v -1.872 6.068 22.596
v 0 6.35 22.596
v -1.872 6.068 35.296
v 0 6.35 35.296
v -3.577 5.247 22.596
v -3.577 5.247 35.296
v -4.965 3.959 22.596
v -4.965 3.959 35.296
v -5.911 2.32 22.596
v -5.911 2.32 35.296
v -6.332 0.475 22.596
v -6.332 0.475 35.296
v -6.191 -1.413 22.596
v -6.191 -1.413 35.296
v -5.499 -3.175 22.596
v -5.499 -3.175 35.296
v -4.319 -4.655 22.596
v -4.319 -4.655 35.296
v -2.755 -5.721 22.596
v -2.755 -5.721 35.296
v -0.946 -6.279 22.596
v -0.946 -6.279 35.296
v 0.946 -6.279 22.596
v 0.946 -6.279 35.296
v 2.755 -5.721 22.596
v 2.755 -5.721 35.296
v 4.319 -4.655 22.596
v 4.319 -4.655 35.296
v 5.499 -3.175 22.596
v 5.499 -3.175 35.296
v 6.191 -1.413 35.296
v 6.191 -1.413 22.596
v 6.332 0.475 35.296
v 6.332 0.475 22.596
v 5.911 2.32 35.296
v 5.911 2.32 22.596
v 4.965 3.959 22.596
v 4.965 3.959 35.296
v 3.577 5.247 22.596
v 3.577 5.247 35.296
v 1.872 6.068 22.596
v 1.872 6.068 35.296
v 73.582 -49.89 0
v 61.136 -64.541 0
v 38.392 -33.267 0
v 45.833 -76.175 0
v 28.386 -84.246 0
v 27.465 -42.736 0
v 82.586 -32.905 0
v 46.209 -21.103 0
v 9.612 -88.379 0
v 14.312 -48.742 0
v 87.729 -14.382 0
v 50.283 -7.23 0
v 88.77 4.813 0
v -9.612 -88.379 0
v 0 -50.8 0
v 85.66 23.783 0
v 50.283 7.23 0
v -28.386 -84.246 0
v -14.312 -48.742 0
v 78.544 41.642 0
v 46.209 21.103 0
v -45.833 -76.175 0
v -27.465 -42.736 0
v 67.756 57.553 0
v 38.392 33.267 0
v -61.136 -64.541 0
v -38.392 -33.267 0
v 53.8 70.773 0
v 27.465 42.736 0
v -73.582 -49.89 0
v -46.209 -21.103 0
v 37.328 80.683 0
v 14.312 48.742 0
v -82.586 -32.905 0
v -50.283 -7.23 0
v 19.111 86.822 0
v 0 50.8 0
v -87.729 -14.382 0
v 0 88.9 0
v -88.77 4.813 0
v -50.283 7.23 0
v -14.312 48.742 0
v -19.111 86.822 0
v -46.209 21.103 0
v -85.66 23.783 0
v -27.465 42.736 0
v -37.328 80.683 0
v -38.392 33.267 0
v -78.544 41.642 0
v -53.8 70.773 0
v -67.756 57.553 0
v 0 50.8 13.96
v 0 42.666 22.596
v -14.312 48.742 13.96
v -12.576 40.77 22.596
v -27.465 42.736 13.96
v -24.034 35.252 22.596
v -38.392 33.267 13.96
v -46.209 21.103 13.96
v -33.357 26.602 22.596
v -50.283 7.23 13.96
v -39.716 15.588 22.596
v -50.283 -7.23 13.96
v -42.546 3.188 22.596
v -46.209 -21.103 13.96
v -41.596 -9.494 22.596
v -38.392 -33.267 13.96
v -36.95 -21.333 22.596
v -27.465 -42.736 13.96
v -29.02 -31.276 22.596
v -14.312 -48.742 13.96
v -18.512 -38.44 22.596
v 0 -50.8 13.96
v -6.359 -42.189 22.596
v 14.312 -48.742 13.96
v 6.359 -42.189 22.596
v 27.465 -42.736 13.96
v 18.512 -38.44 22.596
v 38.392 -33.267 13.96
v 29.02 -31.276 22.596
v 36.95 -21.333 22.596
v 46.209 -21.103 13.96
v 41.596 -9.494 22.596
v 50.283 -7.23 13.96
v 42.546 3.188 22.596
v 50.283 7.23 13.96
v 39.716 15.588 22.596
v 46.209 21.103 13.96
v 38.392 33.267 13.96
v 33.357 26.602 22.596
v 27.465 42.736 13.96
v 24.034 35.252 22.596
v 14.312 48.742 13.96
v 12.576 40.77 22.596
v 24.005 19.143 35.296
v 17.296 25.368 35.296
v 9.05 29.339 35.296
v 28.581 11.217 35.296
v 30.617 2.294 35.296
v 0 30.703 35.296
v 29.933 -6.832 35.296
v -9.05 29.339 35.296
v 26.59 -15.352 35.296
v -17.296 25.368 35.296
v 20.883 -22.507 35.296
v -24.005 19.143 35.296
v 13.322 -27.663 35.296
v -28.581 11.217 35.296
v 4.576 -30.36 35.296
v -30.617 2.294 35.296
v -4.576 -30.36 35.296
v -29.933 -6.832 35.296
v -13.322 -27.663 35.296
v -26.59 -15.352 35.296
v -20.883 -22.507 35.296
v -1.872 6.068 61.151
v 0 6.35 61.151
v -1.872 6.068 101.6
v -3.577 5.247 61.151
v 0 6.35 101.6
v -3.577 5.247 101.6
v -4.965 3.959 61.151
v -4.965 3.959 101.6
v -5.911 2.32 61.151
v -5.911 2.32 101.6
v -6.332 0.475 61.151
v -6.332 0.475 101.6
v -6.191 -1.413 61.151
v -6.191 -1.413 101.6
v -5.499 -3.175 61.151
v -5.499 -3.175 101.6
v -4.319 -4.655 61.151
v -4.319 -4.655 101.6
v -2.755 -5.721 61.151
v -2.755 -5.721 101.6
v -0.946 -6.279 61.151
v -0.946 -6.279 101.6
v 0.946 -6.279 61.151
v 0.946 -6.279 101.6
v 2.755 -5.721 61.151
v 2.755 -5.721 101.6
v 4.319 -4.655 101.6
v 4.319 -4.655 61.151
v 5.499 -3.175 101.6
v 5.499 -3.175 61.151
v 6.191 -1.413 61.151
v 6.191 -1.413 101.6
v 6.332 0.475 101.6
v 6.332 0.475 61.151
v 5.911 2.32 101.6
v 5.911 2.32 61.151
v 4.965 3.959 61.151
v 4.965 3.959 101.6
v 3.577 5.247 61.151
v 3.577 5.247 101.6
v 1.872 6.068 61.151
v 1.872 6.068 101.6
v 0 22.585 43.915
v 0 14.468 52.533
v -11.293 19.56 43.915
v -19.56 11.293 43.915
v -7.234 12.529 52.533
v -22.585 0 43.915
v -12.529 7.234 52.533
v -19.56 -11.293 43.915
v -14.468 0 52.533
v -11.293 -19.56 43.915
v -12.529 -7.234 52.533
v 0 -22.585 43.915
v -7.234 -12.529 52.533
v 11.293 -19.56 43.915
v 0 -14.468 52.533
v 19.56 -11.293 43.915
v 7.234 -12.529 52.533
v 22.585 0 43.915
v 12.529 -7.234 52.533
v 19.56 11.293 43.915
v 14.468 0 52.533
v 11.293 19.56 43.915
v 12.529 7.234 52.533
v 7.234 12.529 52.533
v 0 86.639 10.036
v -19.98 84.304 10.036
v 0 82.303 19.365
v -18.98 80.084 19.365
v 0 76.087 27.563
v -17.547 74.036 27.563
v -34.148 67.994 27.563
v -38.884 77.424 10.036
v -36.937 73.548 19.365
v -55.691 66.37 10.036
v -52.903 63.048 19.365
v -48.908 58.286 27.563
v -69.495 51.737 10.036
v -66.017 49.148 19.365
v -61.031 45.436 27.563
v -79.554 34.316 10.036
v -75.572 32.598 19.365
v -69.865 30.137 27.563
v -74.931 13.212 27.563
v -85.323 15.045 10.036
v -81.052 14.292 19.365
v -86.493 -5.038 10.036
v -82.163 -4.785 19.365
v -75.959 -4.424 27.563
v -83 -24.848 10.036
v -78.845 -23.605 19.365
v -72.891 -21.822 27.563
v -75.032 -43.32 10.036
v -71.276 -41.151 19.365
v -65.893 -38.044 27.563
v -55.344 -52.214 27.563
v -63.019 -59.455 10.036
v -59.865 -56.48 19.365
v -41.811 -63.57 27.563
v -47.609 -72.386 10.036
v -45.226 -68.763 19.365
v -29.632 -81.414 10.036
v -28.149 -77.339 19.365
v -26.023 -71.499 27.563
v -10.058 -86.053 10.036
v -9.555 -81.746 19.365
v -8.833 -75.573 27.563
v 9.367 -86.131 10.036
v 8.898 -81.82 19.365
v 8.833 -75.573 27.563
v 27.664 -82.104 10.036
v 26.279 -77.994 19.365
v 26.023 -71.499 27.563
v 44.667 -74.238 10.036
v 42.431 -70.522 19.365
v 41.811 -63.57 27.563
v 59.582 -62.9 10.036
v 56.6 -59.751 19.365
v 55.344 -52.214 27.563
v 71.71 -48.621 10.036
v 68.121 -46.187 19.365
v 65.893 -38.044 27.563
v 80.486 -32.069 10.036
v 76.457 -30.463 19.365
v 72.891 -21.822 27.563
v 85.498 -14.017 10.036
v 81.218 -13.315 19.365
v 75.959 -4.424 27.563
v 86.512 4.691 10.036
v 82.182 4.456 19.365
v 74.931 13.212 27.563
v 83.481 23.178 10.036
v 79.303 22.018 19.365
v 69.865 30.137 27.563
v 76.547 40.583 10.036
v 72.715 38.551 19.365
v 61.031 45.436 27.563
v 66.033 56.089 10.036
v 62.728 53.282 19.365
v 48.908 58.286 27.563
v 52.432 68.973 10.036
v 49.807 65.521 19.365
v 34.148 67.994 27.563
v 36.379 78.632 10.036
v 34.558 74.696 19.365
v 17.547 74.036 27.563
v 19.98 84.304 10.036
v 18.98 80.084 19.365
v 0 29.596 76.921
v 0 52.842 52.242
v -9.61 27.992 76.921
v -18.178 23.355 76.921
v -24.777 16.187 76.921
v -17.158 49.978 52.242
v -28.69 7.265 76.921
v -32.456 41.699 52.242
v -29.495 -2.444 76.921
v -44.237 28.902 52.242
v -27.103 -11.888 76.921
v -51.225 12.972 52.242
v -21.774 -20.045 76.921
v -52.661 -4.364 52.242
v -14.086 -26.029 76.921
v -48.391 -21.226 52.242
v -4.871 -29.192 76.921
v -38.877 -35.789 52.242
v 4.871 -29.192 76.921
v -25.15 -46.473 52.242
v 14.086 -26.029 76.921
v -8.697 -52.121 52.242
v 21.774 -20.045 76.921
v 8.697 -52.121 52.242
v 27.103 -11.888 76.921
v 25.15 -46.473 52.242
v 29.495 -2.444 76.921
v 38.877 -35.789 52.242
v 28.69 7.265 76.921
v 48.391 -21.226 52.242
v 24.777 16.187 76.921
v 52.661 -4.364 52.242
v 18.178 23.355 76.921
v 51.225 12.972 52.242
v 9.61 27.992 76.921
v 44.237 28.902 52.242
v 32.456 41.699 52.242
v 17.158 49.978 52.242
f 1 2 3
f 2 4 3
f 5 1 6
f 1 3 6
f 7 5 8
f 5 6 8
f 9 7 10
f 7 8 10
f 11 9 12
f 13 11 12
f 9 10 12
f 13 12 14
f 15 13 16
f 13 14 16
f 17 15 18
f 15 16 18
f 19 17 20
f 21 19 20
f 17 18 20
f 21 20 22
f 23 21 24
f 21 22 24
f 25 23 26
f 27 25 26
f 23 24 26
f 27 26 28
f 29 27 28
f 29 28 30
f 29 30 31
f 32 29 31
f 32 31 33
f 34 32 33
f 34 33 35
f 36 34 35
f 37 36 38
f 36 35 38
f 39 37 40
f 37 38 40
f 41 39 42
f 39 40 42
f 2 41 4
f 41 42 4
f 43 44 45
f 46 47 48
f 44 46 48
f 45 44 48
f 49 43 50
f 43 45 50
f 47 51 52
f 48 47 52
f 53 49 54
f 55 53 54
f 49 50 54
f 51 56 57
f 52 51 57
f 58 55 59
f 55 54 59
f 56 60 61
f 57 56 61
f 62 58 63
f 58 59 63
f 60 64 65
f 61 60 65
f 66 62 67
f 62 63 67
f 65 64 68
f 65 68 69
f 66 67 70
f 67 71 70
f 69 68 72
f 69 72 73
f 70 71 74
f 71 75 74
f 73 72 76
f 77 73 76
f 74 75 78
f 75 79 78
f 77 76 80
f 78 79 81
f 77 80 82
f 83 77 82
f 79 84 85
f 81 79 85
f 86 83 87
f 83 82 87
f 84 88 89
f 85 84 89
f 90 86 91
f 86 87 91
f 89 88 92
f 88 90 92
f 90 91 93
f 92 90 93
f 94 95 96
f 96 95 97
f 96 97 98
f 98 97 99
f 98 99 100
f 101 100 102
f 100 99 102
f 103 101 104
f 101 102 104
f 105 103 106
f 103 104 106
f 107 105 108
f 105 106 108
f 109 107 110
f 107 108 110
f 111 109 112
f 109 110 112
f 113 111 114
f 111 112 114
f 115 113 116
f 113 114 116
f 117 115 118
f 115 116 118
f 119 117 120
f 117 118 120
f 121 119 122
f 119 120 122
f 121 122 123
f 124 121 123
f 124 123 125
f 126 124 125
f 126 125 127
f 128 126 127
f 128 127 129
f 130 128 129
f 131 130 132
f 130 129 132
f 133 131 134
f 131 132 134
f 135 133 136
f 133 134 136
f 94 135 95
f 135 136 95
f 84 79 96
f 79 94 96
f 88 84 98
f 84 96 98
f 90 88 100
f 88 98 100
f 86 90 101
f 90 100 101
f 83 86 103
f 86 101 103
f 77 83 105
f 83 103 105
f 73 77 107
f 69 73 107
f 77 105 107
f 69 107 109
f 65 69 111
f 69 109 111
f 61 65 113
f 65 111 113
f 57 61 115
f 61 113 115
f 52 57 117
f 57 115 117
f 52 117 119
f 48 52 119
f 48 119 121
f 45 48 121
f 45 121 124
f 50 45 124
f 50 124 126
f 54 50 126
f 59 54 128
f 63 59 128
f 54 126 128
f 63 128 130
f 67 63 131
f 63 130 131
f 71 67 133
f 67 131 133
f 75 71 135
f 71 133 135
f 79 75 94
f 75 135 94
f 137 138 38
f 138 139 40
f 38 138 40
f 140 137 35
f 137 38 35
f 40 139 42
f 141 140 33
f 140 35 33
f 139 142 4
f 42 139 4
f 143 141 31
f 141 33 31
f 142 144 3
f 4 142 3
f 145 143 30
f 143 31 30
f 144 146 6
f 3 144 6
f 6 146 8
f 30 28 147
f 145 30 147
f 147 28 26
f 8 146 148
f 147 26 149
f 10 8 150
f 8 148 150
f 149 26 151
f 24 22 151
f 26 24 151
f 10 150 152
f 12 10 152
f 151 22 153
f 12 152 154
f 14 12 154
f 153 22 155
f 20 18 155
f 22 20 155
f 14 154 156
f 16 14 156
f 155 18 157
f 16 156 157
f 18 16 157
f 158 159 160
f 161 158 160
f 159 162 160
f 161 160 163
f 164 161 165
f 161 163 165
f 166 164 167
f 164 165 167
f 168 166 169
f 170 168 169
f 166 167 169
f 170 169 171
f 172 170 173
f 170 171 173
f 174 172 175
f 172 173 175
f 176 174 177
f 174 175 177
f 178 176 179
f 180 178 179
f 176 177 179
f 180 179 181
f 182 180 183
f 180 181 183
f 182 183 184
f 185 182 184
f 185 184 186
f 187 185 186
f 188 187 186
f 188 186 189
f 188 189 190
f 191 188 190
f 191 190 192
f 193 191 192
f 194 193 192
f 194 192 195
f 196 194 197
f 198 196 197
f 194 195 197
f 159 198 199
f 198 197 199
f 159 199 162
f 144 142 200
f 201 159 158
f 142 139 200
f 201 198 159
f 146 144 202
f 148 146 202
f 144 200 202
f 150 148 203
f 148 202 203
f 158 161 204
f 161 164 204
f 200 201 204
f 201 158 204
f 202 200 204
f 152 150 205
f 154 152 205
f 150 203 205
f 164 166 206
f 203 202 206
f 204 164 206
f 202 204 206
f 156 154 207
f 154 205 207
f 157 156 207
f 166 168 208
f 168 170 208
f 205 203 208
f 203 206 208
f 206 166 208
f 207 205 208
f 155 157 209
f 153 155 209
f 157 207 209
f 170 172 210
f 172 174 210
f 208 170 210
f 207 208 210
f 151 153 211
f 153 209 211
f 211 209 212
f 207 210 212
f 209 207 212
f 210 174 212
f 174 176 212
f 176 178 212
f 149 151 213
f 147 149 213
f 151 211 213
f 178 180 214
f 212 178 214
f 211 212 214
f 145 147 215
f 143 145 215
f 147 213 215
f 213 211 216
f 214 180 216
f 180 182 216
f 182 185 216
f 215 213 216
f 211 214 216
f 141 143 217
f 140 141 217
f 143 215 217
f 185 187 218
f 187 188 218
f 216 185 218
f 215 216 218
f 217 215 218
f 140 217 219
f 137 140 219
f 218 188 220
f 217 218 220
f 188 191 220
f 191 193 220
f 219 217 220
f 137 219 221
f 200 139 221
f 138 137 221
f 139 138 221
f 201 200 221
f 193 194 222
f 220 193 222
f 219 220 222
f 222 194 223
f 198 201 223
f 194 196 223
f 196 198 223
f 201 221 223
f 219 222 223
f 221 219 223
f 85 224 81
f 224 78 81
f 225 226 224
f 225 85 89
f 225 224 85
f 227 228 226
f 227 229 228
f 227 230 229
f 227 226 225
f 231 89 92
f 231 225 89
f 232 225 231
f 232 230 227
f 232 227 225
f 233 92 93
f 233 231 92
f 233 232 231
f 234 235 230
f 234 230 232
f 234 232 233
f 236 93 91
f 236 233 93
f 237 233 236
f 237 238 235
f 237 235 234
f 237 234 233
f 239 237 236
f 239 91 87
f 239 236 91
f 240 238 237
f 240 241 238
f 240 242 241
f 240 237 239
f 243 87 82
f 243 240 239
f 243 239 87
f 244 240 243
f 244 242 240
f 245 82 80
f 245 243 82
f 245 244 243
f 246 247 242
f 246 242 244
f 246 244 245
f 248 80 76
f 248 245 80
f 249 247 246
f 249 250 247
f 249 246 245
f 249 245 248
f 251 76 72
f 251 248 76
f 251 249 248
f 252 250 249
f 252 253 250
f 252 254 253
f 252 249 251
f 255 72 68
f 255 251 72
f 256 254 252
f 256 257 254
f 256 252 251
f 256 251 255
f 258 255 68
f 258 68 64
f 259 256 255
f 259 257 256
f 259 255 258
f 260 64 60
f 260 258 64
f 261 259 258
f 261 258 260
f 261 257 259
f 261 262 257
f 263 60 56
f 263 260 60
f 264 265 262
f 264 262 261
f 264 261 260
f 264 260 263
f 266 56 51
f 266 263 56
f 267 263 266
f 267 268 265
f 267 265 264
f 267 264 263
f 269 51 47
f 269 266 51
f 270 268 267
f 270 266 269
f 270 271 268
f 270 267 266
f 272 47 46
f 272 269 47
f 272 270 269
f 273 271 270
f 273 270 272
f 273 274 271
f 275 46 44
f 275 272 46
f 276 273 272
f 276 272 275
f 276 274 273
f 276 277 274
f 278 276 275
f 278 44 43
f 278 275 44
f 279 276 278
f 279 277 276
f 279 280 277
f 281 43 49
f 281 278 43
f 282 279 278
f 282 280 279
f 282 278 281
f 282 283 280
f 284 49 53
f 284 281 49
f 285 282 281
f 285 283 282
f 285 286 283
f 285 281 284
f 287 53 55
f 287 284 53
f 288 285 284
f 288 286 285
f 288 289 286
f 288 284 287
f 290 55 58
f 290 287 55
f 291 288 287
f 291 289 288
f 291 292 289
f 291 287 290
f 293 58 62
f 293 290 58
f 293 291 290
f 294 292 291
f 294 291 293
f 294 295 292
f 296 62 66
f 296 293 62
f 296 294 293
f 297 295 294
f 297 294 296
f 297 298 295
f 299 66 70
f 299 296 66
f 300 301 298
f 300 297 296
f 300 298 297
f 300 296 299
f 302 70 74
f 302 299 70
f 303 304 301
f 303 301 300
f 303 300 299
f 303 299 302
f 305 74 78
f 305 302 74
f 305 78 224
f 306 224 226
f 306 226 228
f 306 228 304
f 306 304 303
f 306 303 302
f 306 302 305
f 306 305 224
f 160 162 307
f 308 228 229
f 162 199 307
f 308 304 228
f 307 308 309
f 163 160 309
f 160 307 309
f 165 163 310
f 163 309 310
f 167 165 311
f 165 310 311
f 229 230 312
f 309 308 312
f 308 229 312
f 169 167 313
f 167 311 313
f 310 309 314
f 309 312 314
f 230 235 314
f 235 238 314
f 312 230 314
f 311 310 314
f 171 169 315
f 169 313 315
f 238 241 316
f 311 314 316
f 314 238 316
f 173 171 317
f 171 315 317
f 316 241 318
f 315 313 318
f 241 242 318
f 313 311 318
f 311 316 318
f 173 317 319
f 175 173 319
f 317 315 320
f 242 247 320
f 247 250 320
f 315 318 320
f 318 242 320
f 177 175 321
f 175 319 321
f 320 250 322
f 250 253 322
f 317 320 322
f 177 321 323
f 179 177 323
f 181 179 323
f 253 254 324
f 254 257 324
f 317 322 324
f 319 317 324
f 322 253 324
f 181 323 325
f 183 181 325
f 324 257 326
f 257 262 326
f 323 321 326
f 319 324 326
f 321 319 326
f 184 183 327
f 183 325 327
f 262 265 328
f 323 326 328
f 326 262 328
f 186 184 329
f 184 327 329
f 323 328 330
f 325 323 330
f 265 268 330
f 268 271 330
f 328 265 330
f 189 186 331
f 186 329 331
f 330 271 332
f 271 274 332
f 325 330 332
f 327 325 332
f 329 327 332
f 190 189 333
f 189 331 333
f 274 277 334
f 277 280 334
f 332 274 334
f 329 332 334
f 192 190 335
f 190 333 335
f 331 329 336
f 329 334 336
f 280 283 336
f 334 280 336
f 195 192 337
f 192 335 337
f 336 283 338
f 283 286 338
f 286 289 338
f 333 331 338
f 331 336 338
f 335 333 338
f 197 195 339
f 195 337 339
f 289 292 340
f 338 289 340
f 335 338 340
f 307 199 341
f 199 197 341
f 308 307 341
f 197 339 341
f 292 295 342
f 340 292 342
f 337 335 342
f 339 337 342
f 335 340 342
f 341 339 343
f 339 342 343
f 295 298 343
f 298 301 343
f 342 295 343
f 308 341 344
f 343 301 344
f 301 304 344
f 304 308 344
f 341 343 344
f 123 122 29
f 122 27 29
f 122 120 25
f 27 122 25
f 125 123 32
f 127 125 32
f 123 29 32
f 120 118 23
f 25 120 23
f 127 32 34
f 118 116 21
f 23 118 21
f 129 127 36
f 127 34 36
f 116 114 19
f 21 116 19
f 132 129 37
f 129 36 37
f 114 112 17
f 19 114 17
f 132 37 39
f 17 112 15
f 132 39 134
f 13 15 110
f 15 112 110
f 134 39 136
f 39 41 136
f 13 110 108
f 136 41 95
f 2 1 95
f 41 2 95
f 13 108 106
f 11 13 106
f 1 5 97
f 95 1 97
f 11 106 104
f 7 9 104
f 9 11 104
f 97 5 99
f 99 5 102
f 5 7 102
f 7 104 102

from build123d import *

# Parameters (mm, degrees)
FILLET1_R = 48.26


with BuildPart() as part:
    # Sketch2 → Revolve1 (revolve)
    with BuildSketch(Plane.YZ, mode=Mode.PRIVATE) as revolve1_sk:
        Polygon((-50.8, 0), (-50.8, 13.960488096), (-42.665643504, 22.596357665), (-6.35, 22.596357665), (-6.35, 35.296357665), (-30.703173869, 35.296357665), (-6.35, 61.150994506), (-6.35, 101.6), (-88.9, 13.960488096), (-88.9, 0), align=None)
    revolve(revolve1_sk.sketch.rotate(Axis((0, 0, 0), (0, 0, 1)), 180), axis=Axis((0, 0, 0), (0, 0, 1)))

    # Fillet1
    # the kernel refuses this fillet: 48.26 mm, written as the material it takes off along each edge
    with BuildSketch(Plane(origin=(0, 0, 13.960488096), x_dir=(0, 1, 0), z_dir=(1, 0, 0))) as fillet1_piece_1:
        with BuildLine():
            CenterArc((40.957476315, -19.486971855), FILLET1_R, 6.575639672, 36.71144238)
            Line((88.9, -13.960488096), (89.858850474, -13.849958421))
            ThreePointArc((89.858850474, -13.849958421), (89.8652, -6.980244048), (89.8652, 0))
            Line((89.8652, 0), (89.602595492, 0.661793483))
            Line((89.602595492, 0.661793483), (76.789846407, 14.264495797))
            Line((76.789846407, 14.264495797), (76.087250915, 13.602702313))
        make_face()
    revolve(axis=Axis((0, 0, 13.960488096), (0, 0, 1)), mode=Mode.SUBTRACT)


solid = part.part
